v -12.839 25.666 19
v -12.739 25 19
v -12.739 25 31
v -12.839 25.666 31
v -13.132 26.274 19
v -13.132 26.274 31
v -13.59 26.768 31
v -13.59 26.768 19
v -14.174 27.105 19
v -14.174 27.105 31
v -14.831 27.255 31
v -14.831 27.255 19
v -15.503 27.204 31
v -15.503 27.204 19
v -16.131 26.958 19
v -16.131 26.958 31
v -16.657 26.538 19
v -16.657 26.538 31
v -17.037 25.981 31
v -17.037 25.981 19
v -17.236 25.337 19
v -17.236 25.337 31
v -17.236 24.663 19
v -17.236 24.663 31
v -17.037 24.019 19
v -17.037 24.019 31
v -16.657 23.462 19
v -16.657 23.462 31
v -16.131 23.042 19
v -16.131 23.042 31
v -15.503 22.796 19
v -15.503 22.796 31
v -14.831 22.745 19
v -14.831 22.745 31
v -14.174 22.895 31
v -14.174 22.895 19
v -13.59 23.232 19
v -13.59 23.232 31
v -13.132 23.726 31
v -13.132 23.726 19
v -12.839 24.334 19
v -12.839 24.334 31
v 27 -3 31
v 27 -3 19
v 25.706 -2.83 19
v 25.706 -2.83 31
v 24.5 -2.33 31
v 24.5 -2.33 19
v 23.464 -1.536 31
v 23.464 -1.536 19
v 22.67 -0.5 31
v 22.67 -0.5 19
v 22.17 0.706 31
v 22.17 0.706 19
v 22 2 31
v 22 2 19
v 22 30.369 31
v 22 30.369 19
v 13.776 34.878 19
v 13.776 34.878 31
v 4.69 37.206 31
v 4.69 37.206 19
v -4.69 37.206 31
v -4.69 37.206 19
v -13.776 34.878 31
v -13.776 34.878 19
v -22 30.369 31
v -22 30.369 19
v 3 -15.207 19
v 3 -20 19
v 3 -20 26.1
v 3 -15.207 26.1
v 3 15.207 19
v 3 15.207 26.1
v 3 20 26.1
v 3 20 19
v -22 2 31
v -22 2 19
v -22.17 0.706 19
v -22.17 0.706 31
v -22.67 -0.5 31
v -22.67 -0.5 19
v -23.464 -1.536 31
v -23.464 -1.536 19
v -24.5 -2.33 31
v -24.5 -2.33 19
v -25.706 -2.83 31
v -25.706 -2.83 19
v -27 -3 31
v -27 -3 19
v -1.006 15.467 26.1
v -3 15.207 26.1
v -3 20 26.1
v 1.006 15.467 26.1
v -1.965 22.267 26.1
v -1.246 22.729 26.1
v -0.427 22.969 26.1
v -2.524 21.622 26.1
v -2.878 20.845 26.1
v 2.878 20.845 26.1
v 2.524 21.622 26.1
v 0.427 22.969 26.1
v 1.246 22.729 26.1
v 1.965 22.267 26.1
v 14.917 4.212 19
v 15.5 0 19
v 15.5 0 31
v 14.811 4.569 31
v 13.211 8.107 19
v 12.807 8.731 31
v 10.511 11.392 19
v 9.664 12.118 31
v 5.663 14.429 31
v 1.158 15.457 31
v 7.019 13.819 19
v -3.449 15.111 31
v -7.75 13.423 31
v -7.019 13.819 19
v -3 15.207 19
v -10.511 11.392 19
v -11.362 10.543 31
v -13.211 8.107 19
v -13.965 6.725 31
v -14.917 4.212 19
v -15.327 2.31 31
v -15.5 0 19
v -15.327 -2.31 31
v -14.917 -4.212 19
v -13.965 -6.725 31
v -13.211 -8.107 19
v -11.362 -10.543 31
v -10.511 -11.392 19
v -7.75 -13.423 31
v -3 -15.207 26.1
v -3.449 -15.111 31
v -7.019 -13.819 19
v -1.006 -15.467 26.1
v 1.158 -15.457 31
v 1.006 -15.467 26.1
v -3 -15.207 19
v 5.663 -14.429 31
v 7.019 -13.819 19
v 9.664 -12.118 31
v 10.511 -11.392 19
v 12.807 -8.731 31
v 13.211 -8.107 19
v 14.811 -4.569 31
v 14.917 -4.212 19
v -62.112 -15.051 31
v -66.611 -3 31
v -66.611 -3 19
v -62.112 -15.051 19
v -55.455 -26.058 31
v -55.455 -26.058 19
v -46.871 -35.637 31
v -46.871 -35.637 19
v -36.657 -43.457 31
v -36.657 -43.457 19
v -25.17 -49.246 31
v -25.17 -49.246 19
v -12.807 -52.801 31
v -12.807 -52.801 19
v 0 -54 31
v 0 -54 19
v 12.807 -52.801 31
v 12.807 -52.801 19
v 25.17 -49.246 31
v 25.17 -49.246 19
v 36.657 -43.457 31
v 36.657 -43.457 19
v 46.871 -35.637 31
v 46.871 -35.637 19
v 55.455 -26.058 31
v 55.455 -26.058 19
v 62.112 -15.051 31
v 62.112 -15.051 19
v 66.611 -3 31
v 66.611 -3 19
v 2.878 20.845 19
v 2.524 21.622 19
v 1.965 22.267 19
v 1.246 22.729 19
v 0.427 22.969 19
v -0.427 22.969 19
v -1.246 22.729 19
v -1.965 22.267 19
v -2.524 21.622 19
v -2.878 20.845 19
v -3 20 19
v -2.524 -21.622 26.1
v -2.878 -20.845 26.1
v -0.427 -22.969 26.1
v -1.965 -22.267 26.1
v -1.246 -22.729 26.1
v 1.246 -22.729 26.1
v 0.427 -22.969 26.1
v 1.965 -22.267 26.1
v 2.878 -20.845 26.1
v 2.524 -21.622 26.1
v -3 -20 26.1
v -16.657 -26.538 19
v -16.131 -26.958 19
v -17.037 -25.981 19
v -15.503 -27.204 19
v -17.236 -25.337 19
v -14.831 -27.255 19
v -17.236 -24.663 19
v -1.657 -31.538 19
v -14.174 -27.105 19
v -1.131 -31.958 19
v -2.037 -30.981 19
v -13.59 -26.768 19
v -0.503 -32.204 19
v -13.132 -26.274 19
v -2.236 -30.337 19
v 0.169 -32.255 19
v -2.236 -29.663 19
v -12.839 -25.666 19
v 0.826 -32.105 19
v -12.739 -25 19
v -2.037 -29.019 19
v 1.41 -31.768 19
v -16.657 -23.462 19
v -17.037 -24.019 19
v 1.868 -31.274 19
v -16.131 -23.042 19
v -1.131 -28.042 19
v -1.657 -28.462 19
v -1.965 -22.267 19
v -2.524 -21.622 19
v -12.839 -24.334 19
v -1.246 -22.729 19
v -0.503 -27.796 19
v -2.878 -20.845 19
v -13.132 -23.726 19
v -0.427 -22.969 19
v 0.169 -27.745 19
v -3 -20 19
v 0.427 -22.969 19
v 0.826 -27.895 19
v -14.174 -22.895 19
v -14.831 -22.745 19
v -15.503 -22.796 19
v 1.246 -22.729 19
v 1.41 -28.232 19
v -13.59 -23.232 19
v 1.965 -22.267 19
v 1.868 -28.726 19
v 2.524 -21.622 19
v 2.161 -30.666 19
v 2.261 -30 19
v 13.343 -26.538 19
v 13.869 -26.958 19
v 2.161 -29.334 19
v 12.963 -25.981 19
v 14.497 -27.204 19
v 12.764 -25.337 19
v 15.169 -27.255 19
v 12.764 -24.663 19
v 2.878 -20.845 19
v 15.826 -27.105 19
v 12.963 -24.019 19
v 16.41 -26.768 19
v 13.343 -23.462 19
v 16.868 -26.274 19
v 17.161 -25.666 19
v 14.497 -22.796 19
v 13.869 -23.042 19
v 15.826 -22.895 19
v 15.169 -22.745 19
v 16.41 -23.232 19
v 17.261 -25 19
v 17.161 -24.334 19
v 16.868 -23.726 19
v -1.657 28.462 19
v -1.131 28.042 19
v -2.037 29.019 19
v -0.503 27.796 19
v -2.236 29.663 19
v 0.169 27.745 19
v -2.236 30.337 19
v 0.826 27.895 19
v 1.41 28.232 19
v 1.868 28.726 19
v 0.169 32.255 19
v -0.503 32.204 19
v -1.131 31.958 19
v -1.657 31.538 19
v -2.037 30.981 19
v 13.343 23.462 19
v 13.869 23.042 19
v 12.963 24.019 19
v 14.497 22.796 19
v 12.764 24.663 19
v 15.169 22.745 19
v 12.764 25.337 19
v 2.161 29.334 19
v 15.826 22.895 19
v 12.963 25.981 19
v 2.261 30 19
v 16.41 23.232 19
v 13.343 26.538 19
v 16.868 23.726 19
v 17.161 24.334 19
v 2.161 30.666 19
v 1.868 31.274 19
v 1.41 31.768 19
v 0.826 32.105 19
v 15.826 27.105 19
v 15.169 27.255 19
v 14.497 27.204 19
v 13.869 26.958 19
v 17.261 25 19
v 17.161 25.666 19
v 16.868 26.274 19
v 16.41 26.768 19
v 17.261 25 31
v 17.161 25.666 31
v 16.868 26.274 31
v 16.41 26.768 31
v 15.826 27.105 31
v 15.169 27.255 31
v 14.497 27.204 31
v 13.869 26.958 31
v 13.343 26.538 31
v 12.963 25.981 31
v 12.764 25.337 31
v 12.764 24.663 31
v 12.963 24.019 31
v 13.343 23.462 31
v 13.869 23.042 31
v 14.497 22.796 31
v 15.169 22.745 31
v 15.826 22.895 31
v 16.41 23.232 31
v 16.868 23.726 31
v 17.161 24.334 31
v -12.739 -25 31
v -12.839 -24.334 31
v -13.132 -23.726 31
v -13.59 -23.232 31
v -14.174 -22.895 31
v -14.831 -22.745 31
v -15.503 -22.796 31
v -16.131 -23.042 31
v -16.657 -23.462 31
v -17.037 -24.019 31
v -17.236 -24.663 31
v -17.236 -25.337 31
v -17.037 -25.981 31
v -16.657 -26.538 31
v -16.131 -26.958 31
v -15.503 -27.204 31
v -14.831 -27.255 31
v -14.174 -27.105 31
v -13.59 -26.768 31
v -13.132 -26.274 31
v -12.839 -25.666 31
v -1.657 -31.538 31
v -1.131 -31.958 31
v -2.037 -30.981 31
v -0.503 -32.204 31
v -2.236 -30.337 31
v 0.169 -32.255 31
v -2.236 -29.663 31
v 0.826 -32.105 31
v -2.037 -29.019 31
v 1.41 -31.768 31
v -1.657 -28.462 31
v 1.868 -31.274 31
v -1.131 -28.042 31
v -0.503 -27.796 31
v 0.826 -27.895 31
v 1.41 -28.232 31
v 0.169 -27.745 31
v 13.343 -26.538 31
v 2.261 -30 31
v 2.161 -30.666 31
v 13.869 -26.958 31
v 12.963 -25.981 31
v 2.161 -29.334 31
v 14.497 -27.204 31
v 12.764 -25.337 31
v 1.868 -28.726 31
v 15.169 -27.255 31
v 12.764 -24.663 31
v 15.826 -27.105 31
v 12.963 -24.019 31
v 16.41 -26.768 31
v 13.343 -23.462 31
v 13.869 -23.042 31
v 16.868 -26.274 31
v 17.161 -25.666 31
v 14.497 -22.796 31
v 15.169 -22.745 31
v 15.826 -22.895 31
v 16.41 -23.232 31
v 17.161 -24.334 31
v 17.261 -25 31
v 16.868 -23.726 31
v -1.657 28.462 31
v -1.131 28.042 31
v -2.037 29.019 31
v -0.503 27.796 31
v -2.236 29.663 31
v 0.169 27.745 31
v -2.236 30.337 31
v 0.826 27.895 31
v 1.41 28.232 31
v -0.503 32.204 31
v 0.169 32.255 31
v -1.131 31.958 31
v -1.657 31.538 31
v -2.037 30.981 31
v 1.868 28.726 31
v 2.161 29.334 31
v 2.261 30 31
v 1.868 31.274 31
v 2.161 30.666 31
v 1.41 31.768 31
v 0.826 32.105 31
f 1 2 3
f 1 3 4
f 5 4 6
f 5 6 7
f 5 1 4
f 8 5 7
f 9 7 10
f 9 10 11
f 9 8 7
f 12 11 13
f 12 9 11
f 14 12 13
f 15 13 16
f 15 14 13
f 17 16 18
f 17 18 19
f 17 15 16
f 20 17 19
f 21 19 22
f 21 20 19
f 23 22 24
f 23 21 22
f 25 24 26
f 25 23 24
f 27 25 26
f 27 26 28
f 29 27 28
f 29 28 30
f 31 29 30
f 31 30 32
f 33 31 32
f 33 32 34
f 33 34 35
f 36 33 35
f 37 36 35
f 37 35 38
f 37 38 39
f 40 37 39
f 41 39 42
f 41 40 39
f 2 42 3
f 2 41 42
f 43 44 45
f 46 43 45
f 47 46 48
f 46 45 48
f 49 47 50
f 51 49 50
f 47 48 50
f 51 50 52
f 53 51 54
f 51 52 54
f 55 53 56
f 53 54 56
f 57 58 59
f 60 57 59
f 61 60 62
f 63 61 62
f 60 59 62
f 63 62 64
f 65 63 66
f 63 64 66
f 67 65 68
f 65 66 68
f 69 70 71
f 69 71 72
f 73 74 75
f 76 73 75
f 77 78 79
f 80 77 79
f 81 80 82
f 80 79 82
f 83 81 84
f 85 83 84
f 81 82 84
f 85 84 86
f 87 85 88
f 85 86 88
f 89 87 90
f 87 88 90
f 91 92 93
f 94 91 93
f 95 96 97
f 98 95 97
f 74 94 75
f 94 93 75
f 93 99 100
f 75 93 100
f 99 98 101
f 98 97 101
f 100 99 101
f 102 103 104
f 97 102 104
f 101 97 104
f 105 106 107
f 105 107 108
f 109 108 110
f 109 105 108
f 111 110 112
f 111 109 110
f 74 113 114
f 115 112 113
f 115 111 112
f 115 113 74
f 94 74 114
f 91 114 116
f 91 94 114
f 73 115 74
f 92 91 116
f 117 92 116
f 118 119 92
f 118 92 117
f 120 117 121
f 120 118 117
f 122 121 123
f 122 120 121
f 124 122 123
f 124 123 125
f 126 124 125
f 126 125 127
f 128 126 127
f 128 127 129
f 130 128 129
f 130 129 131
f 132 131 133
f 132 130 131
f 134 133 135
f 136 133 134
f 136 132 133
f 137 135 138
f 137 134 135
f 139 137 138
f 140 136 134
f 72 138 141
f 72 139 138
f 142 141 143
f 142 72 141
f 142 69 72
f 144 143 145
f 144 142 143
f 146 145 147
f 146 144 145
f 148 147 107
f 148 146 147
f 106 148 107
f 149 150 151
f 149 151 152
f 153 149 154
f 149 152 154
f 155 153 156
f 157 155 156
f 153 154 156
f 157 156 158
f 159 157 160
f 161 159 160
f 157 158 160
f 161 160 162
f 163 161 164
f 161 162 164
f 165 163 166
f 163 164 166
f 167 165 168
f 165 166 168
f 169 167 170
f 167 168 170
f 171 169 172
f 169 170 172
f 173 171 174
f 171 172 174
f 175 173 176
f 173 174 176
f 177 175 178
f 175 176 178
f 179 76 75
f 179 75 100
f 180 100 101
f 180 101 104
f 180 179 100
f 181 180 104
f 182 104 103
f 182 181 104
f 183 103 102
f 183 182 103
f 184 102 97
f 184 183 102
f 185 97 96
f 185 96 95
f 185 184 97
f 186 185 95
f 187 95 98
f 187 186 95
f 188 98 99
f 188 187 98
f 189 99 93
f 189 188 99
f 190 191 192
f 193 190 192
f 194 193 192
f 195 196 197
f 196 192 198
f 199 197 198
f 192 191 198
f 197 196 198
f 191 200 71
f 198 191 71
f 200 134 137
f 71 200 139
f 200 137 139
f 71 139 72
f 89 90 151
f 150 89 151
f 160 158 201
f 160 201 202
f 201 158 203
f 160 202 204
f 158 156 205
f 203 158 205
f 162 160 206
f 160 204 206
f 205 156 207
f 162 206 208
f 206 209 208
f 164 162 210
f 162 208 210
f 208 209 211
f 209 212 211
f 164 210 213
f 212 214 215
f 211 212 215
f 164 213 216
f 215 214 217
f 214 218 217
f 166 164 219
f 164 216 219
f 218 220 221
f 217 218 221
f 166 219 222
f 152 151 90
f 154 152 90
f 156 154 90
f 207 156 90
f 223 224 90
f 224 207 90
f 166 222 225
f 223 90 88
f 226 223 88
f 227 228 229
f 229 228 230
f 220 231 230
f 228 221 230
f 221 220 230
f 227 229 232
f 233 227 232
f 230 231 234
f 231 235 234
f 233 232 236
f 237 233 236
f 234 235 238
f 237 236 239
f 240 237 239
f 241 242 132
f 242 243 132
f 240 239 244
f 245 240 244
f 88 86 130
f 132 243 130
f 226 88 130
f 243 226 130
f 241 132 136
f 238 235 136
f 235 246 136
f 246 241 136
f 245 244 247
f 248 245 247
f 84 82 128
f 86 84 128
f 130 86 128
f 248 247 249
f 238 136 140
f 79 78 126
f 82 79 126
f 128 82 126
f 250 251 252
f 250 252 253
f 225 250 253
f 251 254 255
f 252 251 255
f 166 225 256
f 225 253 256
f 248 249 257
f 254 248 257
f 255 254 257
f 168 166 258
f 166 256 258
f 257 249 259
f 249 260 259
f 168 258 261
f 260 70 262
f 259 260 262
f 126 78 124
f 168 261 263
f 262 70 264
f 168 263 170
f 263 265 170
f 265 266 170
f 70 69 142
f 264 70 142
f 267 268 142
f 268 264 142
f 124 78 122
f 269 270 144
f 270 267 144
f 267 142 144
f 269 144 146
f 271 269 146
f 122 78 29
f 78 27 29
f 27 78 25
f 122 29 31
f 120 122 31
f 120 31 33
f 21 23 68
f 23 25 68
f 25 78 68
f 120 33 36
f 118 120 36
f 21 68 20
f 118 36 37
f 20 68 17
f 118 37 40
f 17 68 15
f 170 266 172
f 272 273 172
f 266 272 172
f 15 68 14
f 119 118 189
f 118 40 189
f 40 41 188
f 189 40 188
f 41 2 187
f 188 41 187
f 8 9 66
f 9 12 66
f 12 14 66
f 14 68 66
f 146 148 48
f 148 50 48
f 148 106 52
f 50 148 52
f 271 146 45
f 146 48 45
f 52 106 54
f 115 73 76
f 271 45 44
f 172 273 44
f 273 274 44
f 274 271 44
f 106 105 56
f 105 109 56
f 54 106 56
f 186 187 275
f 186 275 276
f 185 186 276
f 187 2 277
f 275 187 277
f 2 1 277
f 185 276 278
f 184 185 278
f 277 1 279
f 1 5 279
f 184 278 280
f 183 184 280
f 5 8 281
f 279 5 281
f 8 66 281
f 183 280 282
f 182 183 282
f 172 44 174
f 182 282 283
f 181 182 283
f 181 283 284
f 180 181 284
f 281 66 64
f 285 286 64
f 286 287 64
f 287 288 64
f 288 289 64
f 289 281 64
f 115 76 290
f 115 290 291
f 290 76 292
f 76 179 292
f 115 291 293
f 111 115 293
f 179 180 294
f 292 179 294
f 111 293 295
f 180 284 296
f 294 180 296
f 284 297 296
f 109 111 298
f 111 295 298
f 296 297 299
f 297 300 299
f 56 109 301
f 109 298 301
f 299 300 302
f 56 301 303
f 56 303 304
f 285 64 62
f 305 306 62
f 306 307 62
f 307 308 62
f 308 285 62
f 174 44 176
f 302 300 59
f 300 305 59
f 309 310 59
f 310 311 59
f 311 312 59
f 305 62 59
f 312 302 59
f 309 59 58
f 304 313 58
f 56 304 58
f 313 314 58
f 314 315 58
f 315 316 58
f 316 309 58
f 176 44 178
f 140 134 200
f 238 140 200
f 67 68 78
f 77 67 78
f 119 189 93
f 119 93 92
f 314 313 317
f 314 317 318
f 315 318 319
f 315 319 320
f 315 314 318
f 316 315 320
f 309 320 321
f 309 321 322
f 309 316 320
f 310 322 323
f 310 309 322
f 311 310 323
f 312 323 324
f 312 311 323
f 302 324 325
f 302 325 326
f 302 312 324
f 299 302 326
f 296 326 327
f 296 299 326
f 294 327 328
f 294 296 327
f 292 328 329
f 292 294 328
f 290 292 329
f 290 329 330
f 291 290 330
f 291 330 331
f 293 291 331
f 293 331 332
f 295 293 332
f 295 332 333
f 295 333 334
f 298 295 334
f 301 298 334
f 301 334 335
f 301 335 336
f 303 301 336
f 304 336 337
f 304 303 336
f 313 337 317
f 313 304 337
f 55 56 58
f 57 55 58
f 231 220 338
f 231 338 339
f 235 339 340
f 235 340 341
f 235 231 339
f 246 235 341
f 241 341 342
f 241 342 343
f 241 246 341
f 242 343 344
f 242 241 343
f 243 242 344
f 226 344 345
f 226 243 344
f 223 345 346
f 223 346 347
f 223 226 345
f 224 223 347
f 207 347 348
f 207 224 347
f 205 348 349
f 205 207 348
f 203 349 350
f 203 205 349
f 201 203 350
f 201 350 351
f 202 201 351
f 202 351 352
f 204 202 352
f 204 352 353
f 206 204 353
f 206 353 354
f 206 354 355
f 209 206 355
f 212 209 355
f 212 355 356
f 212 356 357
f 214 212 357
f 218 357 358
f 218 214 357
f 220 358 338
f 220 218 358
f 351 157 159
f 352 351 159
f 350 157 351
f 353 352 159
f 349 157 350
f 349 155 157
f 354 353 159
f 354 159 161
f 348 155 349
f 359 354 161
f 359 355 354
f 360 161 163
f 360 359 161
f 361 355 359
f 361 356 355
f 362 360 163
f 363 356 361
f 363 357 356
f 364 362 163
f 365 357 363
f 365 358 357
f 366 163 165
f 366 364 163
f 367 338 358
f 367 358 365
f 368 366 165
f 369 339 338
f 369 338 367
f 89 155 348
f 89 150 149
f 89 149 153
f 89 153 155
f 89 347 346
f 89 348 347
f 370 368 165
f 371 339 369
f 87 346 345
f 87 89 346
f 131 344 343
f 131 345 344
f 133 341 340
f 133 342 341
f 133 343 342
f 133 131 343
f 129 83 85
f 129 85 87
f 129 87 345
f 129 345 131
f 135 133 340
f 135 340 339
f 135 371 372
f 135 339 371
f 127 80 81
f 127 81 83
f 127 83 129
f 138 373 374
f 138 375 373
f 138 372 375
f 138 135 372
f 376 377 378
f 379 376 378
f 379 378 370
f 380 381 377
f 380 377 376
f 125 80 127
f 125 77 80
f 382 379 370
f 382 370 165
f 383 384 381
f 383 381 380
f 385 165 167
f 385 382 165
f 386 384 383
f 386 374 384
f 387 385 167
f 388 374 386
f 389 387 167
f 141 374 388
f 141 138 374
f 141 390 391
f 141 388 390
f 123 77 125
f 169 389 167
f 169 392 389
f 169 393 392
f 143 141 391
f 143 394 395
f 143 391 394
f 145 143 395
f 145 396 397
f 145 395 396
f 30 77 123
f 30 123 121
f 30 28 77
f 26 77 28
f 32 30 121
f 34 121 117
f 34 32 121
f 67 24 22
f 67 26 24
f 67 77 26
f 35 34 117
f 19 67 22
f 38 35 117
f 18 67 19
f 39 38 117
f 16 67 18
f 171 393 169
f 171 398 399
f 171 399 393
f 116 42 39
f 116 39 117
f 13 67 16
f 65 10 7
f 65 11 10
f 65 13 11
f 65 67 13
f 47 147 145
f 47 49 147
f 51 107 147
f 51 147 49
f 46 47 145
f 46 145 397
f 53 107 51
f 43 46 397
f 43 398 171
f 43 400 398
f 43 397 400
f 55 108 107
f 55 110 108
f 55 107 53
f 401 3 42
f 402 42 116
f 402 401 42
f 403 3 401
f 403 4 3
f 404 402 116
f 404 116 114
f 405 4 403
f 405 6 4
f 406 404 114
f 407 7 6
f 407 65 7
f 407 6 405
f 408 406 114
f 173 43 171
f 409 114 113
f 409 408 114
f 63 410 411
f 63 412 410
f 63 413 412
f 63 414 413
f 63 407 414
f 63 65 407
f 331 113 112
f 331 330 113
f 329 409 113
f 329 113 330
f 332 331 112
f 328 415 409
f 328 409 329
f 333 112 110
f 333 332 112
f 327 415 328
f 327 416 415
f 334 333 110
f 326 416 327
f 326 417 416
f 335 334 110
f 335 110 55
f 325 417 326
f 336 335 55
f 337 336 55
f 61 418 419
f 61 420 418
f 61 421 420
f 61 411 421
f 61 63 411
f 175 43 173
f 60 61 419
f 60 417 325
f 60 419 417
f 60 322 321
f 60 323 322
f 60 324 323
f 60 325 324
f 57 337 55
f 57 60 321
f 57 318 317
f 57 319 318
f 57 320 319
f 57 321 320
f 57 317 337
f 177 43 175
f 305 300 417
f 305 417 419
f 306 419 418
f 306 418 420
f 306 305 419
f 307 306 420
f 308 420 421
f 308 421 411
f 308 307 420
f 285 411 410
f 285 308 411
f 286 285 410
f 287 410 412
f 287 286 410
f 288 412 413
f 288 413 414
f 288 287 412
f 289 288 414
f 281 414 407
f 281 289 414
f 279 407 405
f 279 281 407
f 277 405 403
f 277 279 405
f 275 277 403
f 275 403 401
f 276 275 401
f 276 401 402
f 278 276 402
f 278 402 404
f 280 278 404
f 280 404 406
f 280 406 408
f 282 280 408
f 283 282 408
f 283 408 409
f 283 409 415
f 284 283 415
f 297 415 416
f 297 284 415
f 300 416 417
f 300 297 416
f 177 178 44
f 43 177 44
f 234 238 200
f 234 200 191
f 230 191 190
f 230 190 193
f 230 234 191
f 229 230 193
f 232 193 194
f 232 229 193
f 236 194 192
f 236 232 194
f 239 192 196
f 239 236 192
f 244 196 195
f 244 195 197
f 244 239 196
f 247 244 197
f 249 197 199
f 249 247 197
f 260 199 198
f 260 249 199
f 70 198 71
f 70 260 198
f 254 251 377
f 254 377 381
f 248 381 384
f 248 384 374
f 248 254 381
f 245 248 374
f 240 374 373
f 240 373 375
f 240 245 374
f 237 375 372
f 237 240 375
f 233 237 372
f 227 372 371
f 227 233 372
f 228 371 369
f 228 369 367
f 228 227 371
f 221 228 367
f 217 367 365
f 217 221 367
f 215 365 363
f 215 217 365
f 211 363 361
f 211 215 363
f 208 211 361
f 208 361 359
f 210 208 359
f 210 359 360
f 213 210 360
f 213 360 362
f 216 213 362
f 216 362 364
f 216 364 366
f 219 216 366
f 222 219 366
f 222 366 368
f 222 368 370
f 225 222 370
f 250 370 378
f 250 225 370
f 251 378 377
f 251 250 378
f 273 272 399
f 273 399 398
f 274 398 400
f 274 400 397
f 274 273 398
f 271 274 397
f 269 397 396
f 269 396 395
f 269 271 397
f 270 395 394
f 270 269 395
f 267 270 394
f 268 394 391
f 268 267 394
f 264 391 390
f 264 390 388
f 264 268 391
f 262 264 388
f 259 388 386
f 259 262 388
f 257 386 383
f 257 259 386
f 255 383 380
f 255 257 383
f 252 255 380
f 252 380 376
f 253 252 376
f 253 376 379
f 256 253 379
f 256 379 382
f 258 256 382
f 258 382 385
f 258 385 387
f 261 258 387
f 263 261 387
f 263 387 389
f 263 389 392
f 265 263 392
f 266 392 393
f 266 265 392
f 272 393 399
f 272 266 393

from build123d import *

# Parameters (mm, degrees)
F2_R     = 2.261012
F2_R_2   = 15.5
F3_DEPTH = 12
F5_DEPTH = 7.1


with BuildPart() as f3:
    # F2 (on offset) → F3 (new body)
    with BuildSketch(Plane.XY.offset(19)):
        with BuildLine():
            ThreePointArc((-22, 2), (-23.464466, -1.535534), (-27, -3))
            Line((-27, -3), (-66.61081, -3))
            ThreePointArc((-66.61081, -3), (0, -54), (66.61081, -3))
            Line((66.61081, -3), (27, -3))
            ThreePointArc((27, -3), (23.464466, -1.535534), (22, 2))
            Line((22, 2), (22, 30.368569))
            ThreePointArc((22, 30.368569), (0, 37.5), (-22, 30.368569))
            Line((-22, 30.368569), (-22, 2))
        make_face()
        with Locations((-15, -25)):
            Circle(F2_R, mode=Mode.SUBTRACT)
        with Locations((0, -30)):
            Circle(F2_R, mode=Mode.SUBTRACT)
        with Locations((15, -25)):
            Circle(F2_R, mode=Mode.SUBTRACT)
        with Locations((-15, 25)):
            Circle(F2_R, mode=Mode.SUBTRACT)
        Circle(F2_R_2, mode=Mode.SUBTRACT)
        with Locations((15, 25)):
            Circle(F2_R, mode=Mode.SUBTRACT)
        with Locations((0, 30)):
            Circle(F2_R, mode=Mode.SUBTRACT)
    extrude(amount=F3_DEPTH)

    # F4 (on offset) → F5 (cut)
    with BuildSketch(Plane.XY.offset(19)):
        with BuildLine():
            Line((-3, 0), (-3, -20))
            ThreePointArc((-3, -20), (0, -23), (3, -20))
            Line((3, -20), (3, 0))
            Line((3, 0), (3, 20))
            ThreePointArc((3, 20), (0, 23), (-3, 20))
            Line((-3, 20), (-3, 0))
        make_face()
    extrude(amount=F5_DEPTH, mode=Mode.SUBTRACT)


solid = f3.part
